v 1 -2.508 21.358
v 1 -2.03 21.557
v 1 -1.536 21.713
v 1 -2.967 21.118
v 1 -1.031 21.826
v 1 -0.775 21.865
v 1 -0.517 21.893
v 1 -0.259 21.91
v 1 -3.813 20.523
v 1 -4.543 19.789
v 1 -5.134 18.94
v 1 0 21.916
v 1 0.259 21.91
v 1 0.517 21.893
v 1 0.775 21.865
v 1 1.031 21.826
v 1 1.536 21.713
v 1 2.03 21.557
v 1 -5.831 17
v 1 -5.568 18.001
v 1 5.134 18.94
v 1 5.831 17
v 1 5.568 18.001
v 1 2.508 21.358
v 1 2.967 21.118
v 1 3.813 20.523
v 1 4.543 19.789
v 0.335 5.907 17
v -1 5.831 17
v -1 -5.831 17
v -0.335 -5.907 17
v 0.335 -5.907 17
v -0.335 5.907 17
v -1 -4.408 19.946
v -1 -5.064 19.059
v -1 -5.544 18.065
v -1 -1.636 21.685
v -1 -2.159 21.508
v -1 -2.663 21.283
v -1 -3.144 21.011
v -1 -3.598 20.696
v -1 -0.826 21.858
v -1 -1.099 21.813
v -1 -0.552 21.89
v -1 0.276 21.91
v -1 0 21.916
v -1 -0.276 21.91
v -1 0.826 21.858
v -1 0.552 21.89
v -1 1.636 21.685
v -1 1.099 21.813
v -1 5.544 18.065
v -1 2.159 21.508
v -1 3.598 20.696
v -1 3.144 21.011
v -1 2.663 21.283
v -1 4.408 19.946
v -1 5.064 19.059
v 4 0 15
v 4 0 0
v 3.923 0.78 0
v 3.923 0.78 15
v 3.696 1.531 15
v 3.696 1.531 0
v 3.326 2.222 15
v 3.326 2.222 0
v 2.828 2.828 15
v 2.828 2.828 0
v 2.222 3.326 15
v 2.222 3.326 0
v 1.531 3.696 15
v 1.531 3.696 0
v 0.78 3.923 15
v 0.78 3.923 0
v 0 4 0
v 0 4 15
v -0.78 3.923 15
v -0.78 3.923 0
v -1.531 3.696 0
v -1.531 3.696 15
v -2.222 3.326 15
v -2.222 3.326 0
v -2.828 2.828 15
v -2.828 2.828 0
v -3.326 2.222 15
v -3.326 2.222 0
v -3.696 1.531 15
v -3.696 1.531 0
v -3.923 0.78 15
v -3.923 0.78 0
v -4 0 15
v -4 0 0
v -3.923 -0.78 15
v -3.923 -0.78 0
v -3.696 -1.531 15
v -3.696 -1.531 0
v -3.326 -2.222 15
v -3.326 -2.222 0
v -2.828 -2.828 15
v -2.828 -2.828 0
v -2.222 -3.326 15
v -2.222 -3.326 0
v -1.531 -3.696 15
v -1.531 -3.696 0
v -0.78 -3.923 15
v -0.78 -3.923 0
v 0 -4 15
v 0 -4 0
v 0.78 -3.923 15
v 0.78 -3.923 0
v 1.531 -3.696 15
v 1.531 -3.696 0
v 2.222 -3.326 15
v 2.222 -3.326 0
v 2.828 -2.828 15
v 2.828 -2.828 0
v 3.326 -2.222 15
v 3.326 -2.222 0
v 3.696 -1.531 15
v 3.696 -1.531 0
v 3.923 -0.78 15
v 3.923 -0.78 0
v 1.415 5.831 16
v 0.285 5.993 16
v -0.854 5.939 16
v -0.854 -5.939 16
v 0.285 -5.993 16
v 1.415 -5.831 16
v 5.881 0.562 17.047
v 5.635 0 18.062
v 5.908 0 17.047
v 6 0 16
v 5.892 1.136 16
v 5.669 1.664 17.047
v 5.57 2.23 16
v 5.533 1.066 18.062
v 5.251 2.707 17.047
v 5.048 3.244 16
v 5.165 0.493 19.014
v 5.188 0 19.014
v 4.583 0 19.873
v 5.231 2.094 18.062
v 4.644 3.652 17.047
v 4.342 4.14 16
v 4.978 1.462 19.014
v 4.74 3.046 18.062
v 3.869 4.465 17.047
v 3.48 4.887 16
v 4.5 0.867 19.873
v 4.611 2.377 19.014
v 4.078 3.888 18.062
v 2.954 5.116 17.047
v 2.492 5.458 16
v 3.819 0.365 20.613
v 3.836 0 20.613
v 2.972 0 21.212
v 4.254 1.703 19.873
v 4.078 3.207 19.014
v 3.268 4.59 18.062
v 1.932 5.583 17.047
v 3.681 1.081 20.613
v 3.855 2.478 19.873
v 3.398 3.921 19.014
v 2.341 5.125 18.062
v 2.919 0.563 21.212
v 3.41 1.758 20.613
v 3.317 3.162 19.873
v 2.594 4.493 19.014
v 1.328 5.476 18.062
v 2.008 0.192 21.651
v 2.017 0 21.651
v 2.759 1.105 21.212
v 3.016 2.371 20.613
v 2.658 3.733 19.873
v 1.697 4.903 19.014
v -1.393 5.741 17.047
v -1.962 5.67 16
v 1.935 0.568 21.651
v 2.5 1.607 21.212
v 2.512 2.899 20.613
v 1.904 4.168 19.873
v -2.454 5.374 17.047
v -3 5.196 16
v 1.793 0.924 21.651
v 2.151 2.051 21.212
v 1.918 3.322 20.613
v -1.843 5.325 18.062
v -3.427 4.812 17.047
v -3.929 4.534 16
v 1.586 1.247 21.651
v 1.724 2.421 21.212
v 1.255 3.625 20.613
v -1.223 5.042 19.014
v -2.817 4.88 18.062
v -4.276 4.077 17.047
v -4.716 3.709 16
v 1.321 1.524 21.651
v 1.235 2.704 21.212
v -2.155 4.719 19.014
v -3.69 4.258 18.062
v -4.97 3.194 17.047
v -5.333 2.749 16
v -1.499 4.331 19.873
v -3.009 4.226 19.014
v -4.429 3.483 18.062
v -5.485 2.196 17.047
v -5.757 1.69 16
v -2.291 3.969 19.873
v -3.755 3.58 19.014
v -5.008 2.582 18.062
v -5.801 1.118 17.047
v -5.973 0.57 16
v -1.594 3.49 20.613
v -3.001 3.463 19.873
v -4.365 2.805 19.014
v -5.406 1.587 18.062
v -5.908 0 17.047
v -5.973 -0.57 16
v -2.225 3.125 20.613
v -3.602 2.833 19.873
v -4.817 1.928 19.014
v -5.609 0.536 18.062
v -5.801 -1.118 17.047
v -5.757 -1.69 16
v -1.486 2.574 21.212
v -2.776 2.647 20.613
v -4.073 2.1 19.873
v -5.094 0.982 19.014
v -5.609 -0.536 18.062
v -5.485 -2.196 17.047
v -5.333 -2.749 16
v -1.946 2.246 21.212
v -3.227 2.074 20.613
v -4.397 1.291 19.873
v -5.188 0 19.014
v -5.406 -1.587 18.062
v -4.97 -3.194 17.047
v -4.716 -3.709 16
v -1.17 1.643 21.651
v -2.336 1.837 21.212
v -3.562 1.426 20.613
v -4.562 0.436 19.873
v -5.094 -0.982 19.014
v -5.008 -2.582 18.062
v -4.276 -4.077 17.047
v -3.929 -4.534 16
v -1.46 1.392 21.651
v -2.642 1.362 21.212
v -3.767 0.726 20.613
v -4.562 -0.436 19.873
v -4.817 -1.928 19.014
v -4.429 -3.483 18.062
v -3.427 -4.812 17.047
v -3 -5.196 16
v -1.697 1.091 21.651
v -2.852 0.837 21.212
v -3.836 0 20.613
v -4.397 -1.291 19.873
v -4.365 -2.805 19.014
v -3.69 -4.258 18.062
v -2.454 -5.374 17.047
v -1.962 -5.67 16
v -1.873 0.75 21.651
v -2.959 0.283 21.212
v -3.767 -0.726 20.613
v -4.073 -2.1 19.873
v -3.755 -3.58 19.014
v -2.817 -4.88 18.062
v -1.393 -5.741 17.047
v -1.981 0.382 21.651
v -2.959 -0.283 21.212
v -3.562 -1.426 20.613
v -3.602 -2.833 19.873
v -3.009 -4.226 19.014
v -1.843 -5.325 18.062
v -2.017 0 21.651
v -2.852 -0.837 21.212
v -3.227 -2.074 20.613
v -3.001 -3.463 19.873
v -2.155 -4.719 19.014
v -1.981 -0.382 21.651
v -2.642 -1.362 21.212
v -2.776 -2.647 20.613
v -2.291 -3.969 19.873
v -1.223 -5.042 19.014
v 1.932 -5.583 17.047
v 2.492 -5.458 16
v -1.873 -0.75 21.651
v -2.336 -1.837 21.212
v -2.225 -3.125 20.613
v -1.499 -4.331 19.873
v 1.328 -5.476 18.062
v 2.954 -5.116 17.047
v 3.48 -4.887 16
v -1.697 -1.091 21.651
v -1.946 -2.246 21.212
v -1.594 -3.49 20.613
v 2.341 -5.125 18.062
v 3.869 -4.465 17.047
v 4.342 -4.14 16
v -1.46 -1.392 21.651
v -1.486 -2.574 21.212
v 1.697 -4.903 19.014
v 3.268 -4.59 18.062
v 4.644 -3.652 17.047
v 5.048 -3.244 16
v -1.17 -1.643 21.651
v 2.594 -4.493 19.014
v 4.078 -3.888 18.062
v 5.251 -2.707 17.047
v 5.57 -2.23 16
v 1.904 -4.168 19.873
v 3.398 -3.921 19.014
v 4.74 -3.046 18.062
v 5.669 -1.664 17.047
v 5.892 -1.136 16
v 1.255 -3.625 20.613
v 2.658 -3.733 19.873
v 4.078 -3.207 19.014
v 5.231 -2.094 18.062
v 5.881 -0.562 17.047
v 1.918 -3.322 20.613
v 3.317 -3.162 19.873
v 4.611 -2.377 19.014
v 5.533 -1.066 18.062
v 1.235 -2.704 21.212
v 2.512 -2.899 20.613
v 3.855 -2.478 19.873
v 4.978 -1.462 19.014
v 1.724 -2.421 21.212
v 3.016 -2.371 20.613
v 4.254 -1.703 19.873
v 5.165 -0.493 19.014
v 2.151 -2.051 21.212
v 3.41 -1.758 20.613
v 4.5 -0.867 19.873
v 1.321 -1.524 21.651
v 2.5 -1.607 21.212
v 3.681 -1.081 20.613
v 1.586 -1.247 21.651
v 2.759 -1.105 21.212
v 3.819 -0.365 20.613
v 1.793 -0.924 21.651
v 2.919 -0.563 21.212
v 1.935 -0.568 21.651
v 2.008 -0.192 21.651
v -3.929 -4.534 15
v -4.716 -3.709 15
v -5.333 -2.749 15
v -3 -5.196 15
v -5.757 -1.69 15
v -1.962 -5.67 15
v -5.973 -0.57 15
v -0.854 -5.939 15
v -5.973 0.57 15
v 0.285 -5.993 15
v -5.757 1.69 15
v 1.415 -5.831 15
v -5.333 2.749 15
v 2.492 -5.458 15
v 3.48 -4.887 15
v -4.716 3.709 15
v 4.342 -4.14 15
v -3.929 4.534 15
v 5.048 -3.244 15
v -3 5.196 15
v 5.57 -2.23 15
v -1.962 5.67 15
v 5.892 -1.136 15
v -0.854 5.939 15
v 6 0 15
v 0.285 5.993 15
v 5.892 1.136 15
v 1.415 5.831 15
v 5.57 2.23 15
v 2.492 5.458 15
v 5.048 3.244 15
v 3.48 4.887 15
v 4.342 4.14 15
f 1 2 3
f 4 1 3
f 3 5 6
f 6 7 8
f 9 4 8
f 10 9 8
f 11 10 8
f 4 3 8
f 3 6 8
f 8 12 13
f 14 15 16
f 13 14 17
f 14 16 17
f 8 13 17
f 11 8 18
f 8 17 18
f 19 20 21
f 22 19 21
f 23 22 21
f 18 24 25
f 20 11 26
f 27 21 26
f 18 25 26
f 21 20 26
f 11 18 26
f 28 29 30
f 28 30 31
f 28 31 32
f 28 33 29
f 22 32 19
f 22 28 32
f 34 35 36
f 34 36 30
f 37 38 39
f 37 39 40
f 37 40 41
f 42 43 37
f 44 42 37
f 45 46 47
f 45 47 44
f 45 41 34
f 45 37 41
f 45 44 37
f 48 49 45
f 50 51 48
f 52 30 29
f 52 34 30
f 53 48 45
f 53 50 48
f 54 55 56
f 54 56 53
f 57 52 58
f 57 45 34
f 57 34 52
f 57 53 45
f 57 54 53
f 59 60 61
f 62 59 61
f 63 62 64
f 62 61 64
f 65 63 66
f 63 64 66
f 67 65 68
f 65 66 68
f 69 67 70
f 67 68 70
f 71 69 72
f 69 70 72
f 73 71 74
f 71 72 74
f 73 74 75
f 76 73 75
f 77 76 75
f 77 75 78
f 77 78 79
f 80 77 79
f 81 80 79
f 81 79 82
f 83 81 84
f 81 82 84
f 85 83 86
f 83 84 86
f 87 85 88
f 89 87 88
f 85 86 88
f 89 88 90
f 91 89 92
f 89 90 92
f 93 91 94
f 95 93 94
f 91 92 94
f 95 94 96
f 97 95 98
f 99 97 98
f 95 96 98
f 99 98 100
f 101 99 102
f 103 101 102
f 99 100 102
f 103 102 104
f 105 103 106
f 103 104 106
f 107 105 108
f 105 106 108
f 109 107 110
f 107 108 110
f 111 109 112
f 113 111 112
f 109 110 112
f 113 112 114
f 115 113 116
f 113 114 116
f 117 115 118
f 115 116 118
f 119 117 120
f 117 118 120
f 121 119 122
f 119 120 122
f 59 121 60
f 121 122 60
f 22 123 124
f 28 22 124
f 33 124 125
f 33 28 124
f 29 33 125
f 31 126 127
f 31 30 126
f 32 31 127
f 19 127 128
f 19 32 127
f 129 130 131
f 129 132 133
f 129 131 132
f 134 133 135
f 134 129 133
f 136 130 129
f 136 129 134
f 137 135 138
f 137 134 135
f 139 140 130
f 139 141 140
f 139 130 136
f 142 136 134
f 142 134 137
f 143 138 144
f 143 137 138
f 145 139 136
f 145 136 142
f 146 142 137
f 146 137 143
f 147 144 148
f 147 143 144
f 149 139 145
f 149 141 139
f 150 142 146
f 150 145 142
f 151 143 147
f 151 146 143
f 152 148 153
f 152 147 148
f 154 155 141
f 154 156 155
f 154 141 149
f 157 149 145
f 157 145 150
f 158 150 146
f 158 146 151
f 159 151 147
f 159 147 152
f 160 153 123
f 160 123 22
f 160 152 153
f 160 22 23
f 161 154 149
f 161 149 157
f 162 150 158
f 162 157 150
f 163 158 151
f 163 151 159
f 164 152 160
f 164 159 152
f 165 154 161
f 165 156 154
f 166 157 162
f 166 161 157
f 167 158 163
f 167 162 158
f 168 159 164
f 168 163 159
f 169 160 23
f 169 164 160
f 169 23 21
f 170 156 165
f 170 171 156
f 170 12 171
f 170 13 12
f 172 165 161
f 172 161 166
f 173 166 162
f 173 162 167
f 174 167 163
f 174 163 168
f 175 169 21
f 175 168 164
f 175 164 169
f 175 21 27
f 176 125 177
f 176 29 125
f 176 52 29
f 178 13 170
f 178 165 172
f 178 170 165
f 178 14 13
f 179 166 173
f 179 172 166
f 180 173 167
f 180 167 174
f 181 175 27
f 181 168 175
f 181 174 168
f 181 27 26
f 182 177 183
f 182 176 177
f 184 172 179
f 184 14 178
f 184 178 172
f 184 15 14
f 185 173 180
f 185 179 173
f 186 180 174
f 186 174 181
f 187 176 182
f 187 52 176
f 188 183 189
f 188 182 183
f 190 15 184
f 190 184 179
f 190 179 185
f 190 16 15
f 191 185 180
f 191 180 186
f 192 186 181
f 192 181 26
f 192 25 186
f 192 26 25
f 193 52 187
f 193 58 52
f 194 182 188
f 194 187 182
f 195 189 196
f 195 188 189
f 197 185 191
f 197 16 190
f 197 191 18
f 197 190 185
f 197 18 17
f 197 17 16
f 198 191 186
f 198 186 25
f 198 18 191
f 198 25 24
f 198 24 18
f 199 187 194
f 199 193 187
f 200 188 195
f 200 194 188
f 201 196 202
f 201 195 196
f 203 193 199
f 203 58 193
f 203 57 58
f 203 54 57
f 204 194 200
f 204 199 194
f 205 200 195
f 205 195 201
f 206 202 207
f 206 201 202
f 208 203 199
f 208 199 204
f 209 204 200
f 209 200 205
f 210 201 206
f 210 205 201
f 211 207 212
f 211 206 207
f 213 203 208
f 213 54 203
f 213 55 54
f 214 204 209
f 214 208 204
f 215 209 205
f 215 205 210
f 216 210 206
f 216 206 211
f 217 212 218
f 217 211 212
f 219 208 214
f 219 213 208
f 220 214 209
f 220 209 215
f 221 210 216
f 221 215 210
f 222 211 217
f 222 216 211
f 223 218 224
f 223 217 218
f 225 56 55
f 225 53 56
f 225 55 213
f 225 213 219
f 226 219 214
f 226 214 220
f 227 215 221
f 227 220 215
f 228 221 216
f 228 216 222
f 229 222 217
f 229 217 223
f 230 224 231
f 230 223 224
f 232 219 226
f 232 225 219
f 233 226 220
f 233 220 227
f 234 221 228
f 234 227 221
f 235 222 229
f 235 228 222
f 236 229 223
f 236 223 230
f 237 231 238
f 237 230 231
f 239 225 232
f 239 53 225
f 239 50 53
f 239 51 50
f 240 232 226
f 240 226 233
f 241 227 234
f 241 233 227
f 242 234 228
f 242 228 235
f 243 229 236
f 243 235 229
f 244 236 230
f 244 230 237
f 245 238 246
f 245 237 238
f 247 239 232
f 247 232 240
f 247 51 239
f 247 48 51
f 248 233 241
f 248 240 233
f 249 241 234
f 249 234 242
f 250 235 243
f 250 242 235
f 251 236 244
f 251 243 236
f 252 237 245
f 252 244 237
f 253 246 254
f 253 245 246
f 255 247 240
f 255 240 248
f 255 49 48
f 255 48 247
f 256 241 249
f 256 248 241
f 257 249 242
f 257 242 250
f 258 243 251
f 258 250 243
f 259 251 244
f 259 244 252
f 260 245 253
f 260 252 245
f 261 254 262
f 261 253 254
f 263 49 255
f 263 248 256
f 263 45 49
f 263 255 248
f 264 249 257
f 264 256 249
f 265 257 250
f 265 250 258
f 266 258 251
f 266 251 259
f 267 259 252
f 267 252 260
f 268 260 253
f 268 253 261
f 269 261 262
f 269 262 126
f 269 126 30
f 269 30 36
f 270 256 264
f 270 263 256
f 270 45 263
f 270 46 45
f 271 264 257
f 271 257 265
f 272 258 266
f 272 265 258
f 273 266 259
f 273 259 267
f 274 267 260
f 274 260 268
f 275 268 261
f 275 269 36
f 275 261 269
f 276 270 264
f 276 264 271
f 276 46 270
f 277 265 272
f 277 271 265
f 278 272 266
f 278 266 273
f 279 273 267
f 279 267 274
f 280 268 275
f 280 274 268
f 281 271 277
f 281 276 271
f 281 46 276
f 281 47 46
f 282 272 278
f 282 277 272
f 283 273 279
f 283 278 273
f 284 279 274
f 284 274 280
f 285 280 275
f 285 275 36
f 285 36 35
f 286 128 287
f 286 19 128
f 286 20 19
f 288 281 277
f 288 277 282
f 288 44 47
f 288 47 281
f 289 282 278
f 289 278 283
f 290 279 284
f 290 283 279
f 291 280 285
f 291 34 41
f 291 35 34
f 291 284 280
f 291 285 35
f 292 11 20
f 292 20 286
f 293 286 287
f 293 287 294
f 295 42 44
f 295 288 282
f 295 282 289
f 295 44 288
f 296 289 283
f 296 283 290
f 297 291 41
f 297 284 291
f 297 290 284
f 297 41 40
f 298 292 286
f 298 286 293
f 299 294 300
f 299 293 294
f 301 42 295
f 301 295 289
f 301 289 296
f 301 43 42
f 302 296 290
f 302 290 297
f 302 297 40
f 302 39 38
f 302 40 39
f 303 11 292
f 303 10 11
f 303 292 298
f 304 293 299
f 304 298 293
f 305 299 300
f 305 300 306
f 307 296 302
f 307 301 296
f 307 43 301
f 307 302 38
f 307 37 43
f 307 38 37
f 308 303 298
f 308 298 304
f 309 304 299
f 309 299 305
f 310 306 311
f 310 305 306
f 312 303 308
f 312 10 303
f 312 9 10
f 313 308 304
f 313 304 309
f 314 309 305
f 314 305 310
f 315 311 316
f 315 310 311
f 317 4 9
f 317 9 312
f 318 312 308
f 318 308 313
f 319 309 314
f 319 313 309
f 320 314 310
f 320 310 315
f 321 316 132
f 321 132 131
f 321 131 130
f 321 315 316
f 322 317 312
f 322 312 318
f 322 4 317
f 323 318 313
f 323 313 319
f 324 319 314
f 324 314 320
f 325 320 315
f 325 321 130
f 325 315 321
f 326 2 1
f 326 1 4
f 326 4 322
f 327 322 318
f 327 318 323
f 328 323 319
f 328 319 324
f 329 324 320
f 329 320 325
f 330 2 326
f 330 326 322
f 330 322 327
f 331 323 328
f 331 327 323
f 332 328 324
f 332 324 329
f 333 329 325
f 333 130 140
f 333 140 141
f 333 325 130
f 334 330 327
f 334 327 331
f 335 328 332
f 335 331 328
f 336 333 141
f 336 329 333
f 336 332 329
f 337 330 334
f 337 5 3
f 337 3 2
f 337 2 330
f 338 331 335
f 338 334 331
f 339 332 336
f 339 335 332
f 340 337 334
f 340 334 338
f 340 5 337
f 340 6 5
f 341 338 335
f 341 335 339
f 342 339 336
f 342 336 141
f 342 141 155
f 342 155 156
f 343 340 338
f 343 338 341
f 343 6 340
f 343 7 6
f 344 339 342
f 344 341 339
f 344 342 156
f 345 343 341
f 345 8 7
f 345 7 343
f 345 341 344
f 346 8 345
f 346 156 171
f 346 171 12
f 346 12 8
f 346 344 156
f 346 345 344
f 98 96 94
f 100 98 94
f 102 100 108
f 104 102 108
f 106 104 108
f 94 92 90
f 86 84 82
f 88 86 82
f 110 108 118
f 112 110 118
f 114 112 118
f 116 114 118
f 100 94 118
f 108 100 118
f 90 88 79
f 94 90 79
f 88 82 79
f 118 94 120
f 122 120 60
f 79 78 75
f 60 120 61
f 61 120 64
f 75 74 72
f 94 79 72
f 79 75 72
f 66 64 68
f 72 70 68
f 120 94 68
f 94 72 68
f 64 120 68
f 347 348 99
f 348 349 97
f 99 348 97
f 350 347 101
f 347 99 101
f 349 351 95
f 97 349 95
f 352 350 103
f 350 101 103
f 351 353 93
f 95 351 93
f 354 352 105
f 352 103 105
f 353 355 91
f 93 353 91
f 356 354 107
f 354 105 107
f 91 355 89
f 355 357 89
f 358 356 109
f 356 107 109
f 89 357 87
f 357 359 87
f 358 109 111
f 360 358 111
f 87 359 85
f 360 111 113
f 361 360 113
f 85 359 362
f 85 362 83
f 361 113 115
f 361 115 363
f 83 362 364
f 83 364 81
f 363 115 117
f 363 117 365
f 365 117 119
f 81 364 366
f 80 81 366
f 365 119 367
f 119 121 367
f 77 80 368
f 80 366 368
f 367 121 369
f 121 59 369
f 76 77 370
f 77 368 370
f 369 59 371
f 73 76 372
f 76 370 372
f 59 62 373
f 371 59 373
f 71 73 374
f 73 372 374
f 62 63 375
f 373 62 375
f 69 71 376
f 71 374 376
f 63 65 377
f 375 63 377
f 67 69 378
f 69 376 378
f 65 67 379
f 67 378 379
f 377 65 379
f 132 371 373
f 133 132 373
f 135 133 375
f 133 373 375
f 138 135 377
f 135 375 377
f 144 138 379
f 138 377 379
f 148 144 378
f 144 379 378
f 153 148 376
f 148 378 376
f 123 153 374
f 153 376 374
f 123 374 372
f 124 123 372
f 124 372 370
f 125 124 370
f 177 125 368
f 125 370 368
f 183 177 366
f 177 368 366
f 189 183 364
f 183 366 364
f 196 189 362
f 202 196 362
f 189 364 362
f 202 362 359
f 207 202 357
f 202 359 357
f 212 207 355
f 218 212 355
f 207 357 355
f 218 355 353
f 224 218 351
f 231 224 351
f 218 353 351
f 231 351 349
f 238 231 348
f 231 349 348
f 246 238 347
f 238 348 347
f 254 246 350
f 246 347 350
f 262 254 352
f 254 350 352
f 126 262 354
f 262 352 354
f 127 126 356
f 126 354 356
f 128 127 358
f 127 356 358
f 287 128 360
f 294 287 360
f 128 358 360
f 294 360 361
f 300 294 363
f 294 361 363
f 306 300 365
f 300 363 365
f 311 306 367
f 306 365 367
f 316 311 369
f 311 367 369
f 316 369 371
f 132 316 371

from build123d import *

# Parameters (mm, degrees)
SKETCH1_R           = 4
BOSS_EXTRUDE1_DEPTH = 15
SKETCH2_R           = 6
BOSS_EXTRUDE2_DEPTH = 1
DOME1_FACE_RADIUS   = 6
DOME1_HEIGHT        = 6
SKETCH3_W           = 2
SKETCH3_H           = 12.932996947
CUT_EXTRUDE2_DEPTH  = 5


with BuildPart() as part:
    # Sketch1 → Boss-Extrude1 (new body)
    with BuildSketch(Plane.XY):
        Circle(SKETCH1_R)
    extrude(amount=BOSS_EXTRUDE1_DEPTH)

    # Sketch2 → Boss-Extrude2 (add)
    with BuildSketch(Plane.XY.offset(15)):
        Circle(SKETCH2_R)
    extrude(amount=BOSS_EXTRUDE2_DEPTH)

    # Dome1: a dome of height H over a round flat face of radius A is a cap of a sphere of radius (A * A + H * H) / (2 * H)
    dome1_r = (DOME1_FACE_RADIUS * DOME1_FACE_RADIUS + DOME1_HEIGHT * DOME1_HEIGHT) / (2 * DOME1_HEIGHT)
    dome1_base = Plane((0, 0, 16), z_dir=(0, 0, 1))
    with Locations(dome1_base.offset(DOME1_HEIGHT - dome1_r)):
        dome1_ball = Sphere(dome1_r, mode=Mode.PRIVATE)
    add(split(dome1_ball, bisect_by=dome1_base, keep=Keep.TOP, mode=Mode.PRIVATE))

    # Sketch3 → Cut-Extrude2 (cut)
    with BuildSketch(Plane.XY.offset(22)):
        with Locations((0, -0.226721745)):
            Rectangle(SKETCH3_W, SKETCH3_H)
    extrude(amount=-CUT_EXTRUDE2_DEPTH, mode=Mode.SUBTRACT)


solid = part.part
